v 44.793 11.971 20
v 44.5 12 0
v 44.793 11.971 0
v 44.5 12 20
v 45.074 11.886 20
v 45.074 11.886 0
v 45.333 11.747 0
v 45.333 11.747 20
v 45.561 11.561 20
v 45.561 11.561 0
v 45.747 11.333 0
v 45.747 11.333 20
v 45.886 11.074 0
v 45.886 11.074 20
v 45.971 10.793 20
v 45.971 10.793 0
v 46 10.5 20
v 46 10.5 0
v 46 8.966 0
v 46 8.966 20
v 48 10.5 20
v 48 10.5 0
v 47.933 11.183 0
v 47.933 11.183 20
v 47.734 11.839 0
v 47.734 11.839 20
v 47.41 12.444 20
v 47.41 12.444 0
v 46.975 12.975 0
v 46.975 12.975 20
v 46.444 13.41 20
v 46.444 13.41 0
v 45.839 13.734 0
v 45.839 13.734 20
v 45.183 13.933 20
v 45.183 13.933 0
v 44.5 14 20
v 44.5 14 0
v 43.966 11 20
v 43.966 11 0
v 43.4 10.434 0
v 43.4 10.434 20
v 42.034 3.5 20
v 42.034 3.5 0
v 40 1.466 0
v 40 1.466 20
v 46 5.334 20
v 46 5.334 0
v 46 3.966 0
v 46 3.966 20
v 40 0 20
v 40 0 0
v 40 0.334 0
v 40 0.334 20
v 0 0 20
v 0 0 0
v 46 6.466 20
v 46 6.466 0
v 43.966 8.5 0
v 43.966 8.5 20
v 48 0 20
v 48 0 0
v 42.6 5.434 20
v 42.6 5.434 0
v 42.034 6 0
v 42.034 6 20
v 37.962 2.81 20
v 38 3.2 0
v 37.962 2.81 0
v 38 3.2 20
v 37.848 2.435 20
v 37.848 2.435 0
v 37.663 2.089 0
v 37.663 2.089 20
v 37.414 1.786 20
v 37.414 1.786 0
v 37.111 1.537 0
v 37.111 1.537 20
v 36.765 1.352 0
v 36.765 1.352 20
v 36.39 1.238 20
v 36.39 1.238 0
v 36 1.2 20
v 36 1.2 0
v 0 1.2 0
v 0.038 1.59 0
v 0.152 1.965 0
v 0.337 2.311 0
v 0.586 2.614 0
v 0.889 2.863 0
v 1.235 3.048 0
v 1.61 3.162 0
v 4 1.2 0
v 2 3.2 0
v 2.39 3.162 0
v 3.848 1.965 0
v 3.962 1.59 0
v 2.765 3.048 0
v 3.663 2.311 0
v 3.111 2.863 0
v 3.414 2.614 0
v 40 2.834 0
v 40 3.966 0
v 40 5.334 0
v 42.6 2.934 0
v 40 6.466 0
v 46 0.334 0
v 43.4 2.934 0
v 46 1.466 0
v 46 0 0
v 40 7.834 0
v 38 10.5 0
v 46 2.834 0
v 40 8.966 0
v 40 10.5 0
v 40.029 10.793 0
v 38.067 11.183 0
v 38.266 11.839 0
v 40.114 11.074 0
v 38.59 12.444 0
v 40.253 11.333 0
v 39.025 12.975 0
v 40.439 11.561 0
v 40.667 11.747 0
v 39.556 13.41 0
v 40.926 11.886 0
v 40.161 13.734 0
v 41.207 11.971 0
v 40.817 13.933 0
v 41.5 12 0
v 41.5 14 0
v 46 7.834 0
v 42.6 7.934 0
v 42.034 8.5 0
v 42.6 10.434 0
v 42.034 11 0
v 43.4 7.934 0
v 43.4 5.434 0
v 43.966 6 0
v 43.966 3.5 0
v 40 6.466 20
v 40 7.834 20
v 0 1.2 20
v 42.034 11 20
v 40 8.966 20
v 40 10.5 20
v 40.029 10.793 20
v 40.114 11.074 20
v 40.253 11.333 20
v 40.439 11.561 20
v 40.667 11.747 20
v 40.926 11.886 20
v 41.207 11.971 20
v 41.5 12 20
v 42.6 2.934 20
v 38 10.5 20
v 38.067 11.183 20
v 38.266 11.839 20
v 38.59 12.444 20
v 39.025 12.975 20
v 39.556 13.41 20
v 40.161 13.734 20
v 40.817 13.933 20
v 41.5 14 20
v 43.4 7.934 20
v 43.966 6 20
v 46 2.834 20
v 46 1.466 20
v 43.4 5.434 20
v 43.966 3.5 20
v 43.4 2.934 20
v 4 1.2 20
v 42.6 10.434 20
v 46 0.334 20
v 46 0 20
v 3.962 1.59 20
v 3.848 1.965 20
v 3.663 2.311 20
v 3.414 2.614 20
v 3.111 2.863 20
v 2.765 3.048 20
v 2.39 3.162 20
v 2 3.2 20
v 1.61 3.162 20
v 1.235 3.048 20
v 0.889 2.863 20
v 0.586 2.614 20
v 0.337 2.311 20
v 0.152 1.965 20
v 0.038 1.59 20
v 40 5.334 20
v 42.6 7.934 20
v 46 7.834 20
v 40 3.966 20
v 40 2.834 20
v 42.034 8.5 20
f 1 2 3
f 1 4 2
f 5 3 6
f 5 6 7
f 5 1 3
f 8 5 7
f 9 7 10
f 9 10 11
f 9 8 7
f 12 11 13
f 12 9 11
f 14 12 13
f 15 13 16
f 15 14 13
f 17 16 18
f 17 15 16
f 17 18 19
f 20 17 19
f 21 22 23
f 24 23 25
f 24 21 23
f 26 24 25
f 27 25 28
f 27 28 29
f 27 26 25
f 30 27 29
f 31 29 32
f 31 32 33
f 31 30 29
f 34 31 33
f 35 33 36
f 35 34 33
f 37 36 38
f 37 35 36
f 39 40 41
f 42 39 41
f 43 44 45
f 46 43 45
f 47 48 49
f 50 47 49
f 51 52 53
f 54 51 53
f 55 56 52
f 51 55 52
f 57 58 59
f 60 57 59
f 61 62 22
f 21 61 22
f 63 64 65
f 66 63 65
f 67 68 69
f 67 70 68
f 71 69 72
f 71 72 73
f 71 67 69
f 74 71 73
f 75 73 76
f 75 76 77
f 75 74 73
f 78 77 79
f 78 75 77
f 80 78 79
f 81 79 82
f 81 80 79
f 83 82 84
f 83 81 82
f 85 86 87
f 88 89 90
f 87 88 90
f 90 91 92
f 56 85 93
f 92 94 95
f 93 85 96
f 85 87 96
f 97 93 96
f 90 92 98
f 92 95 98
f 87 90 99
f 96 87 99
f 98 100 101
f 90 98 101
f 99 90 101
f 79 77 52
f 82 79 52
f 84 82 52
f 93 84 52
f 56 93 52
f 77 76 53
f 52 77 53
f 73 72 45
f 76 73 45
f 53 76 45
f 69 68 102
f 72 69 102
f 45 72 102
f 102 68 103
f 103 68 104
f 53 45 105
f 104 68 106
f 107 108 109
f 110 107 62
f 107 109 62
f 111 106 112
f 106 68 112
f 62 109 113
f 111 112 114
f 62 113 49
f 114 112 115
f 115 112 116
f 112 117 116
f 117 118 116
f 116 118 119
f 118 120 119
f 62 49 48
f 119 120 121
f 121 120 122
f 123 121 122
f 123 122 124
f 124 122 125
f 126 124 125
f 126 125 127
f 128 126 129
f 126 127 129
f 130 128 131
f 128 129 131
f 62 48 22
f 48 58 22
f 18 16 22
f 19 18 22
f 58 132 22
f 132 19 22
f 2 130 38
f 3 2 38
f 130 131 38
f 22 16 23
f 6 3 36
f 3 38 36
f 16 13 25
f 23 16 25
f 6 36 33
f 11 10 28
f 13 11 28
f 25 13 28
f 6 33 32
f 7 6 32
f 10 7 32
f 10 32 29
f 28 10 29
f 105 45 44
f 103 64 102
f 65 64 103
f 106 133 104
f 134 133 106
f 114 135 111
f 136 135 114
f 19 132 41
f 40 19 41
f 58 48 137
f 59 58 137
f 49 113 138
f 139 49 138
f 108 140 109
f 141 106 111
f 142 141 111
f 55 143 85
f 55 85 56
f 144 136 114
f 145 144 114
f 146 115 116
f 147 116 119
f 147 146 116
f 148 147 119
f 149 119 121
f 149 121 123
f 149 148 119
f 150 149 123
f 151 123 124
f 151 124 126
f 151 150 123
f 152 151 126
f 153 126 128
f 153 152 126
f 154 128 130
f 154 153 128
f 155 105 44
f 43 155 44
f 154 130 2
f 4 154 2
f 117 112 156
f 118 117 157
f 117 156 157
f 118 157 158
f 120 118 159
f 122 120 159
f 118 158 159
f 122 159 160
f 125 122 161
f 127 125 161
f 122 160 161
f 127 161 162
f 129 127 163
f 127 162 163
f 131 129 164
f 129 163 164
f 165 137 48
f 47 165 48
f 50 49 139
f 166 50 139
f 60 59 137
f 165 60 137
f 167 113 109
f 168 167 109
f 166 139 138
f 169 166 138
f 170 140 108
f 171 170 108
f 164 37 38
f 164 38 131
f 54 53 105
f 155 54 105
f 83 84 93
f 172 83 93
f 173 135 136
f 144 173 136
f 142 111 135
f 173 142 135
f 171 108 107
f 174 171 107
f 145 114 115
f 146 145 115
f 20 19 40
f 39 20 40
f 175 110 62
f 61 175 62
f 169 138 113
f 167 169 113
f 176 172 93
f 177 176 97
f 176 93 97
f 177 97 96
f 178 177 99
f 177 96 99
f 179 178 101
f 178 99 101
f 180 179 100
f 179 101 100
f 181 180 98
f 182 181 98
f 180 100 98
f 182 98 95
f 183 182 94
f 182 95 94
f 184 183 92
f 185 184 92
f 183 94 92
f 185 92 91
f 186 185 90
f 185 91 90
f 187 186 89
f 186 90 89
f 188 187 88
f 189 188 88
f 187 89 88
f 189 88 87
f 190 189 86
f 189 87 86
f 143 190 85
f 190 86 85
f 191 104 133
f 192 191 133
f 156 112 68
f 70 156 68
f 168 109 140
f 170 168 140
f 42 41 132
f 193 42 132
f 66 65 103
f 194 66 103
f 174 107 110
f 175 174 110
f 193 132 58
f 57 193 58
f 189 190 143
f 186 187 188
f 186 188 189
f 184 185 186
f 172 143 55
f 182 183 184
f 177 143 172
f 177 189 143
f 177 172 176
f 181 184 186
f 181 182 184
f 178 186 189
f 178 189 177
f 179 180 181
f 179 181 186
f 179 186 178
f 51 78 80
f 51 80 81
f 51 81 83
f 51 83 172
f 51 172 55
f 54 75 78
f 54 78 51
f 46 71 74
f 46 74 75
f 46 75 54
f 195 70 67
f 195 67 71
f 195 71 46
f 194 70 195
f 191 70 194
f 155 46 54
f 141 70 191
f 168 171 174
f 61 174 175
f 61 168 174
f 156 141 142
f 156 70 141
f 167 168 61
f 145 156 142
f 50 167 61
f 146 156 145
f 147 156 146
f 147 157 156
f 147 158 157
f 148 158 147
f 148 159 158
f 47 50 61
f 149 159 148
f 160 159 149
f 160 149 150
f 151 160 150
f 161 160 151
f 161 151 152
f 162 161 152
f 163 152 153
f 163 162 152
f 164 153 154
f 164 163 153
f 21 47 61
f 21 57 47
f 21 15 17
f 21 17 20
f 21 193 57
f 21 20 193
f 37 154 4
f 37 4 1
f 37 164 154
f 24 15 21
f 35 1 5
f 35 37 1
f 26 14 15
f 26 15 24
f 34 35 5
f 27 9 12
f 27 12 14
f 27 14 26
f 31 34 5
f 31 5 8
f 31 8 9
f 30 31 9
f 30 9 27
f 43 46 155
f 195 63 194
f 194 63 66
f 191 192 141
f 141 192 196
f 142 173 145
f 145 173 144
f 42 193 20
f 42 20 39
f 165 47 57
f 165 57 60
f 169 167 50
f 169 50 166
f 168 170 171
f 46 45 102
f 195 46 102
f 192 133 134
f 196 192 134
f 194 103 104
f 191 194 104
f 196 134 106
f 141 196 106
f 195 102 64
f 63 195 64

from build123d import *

# Parameters (mm, degrees)
F1_DEPTH = 20
F2_R     = 1.5
F3_R     = 3.5
F4_R     = 2


with BuildPart() as f1:
    # F0 (on Top) → F1 (new body)
    with BuildSketch(Plane.XY):
        with BuildLine():
            Line((0, 1.2), (0, 0))
            Line((0, 0), (40, 0))
            Line((40, 0), (40, 0.334315))
            Line((40, 0.334315), (40, 1.465685))
            Line((40, 1.465685), (40, 2.834315))
            Line((40, 2.834315), (40, 3.965685))
            Line((40, 3.965685), (40, 5.334315))
            Line((40, 5.334315), (40, 6.465685))
            Line((40, 6.465685), (40, 7.834315))
            Line((40, 7.834315), (40, 8.965685))
            Line((40, 8.965685), (40, 12))
            Line((40, 12), (46, 12))
            Line((46, 12), (46, 8.965685))
            Line((46, 8.965685), (46, 7.834315))
            Line((46, 7.834315), (46, 6.465685))
            Line((46, 6.465685), (46, 5.334315))
            Line((46, 5.334315), (46, 3.965685))
            Line((46, 3.965685), (46, 2.834315))
            Line((46, 2.834315), (46, 1.465685))
            Line((46, 1.465685), (46, 0.334315))
            Line((46, 0.334315), (46, 0))
            Line((46, 0), (48, 0))
            Line((48, 0), (48, 14))
            Line((48, 14), (38, 14))
            Line((38, 14), (38, 1.2))
            Line((38, 1.2), (4, 1.2))
            ThreePointArc((4, 1.2), (2, 3.2), (0, 1.2))
        make_face()
        Polygon((40, 1.465685), (40, 0.334315), (42.6, 2.934315), (42.034315, 3.5), align=None)
        Polygon((40, 3.965685), (40, 2.834315), (42.6, 5.434315), (42.034315, 6), align=None)
        Polygon((40, 6.465685), (40, 5.334315), (42.6, 7.934315), (42.034315, 8.5), align=None)
        Polygon((40, 8.965685), (40, 7.834315), (42.6, 10.434315), (42.034315, 11), align=None)
        Polygon((46, 7.834315), (46, 8.965685), (43.965685, 11), (43.4, 10.434315), align=None)
        Polygon((43.4, 7.934315), (46, 5.334315), (46, 6.465685), (43.965685, 8.5), align=None)
        Polygon((43.4, 5.434315), (46, 2.834315), (46, 3.965685), (43.965685, 6), align=None)
        Polygon((43.4, 2.934315), (46, 0.334315), (46, 1.465685), (43.965685, 3.5), align=None)
    extrude(amount=F1_DEPTH)

    # F2
    f2_edges = [f1.edges().sort_by_distance(p)[0] for p in [
        (40, 12, 10),
        (46, 12, 10),
    ]]
    fillet(f2_edges, radius=F2_R)

    # F3
    f3_edges = [f1.edges().sort_by_distance(p)[0] for p in [
        (38, 14, 10),
        (48, 14, 10),
    ]]
    fillet(f3_edges, radius=F3_R)

    # F4
    f4_edges = [f1.edges().sort_by_distance(p)[0] for p in [
        (38, 1.2, 10),
    ]]
    fillet(f4_edges, radius=F4_R)


solid = f1.part
